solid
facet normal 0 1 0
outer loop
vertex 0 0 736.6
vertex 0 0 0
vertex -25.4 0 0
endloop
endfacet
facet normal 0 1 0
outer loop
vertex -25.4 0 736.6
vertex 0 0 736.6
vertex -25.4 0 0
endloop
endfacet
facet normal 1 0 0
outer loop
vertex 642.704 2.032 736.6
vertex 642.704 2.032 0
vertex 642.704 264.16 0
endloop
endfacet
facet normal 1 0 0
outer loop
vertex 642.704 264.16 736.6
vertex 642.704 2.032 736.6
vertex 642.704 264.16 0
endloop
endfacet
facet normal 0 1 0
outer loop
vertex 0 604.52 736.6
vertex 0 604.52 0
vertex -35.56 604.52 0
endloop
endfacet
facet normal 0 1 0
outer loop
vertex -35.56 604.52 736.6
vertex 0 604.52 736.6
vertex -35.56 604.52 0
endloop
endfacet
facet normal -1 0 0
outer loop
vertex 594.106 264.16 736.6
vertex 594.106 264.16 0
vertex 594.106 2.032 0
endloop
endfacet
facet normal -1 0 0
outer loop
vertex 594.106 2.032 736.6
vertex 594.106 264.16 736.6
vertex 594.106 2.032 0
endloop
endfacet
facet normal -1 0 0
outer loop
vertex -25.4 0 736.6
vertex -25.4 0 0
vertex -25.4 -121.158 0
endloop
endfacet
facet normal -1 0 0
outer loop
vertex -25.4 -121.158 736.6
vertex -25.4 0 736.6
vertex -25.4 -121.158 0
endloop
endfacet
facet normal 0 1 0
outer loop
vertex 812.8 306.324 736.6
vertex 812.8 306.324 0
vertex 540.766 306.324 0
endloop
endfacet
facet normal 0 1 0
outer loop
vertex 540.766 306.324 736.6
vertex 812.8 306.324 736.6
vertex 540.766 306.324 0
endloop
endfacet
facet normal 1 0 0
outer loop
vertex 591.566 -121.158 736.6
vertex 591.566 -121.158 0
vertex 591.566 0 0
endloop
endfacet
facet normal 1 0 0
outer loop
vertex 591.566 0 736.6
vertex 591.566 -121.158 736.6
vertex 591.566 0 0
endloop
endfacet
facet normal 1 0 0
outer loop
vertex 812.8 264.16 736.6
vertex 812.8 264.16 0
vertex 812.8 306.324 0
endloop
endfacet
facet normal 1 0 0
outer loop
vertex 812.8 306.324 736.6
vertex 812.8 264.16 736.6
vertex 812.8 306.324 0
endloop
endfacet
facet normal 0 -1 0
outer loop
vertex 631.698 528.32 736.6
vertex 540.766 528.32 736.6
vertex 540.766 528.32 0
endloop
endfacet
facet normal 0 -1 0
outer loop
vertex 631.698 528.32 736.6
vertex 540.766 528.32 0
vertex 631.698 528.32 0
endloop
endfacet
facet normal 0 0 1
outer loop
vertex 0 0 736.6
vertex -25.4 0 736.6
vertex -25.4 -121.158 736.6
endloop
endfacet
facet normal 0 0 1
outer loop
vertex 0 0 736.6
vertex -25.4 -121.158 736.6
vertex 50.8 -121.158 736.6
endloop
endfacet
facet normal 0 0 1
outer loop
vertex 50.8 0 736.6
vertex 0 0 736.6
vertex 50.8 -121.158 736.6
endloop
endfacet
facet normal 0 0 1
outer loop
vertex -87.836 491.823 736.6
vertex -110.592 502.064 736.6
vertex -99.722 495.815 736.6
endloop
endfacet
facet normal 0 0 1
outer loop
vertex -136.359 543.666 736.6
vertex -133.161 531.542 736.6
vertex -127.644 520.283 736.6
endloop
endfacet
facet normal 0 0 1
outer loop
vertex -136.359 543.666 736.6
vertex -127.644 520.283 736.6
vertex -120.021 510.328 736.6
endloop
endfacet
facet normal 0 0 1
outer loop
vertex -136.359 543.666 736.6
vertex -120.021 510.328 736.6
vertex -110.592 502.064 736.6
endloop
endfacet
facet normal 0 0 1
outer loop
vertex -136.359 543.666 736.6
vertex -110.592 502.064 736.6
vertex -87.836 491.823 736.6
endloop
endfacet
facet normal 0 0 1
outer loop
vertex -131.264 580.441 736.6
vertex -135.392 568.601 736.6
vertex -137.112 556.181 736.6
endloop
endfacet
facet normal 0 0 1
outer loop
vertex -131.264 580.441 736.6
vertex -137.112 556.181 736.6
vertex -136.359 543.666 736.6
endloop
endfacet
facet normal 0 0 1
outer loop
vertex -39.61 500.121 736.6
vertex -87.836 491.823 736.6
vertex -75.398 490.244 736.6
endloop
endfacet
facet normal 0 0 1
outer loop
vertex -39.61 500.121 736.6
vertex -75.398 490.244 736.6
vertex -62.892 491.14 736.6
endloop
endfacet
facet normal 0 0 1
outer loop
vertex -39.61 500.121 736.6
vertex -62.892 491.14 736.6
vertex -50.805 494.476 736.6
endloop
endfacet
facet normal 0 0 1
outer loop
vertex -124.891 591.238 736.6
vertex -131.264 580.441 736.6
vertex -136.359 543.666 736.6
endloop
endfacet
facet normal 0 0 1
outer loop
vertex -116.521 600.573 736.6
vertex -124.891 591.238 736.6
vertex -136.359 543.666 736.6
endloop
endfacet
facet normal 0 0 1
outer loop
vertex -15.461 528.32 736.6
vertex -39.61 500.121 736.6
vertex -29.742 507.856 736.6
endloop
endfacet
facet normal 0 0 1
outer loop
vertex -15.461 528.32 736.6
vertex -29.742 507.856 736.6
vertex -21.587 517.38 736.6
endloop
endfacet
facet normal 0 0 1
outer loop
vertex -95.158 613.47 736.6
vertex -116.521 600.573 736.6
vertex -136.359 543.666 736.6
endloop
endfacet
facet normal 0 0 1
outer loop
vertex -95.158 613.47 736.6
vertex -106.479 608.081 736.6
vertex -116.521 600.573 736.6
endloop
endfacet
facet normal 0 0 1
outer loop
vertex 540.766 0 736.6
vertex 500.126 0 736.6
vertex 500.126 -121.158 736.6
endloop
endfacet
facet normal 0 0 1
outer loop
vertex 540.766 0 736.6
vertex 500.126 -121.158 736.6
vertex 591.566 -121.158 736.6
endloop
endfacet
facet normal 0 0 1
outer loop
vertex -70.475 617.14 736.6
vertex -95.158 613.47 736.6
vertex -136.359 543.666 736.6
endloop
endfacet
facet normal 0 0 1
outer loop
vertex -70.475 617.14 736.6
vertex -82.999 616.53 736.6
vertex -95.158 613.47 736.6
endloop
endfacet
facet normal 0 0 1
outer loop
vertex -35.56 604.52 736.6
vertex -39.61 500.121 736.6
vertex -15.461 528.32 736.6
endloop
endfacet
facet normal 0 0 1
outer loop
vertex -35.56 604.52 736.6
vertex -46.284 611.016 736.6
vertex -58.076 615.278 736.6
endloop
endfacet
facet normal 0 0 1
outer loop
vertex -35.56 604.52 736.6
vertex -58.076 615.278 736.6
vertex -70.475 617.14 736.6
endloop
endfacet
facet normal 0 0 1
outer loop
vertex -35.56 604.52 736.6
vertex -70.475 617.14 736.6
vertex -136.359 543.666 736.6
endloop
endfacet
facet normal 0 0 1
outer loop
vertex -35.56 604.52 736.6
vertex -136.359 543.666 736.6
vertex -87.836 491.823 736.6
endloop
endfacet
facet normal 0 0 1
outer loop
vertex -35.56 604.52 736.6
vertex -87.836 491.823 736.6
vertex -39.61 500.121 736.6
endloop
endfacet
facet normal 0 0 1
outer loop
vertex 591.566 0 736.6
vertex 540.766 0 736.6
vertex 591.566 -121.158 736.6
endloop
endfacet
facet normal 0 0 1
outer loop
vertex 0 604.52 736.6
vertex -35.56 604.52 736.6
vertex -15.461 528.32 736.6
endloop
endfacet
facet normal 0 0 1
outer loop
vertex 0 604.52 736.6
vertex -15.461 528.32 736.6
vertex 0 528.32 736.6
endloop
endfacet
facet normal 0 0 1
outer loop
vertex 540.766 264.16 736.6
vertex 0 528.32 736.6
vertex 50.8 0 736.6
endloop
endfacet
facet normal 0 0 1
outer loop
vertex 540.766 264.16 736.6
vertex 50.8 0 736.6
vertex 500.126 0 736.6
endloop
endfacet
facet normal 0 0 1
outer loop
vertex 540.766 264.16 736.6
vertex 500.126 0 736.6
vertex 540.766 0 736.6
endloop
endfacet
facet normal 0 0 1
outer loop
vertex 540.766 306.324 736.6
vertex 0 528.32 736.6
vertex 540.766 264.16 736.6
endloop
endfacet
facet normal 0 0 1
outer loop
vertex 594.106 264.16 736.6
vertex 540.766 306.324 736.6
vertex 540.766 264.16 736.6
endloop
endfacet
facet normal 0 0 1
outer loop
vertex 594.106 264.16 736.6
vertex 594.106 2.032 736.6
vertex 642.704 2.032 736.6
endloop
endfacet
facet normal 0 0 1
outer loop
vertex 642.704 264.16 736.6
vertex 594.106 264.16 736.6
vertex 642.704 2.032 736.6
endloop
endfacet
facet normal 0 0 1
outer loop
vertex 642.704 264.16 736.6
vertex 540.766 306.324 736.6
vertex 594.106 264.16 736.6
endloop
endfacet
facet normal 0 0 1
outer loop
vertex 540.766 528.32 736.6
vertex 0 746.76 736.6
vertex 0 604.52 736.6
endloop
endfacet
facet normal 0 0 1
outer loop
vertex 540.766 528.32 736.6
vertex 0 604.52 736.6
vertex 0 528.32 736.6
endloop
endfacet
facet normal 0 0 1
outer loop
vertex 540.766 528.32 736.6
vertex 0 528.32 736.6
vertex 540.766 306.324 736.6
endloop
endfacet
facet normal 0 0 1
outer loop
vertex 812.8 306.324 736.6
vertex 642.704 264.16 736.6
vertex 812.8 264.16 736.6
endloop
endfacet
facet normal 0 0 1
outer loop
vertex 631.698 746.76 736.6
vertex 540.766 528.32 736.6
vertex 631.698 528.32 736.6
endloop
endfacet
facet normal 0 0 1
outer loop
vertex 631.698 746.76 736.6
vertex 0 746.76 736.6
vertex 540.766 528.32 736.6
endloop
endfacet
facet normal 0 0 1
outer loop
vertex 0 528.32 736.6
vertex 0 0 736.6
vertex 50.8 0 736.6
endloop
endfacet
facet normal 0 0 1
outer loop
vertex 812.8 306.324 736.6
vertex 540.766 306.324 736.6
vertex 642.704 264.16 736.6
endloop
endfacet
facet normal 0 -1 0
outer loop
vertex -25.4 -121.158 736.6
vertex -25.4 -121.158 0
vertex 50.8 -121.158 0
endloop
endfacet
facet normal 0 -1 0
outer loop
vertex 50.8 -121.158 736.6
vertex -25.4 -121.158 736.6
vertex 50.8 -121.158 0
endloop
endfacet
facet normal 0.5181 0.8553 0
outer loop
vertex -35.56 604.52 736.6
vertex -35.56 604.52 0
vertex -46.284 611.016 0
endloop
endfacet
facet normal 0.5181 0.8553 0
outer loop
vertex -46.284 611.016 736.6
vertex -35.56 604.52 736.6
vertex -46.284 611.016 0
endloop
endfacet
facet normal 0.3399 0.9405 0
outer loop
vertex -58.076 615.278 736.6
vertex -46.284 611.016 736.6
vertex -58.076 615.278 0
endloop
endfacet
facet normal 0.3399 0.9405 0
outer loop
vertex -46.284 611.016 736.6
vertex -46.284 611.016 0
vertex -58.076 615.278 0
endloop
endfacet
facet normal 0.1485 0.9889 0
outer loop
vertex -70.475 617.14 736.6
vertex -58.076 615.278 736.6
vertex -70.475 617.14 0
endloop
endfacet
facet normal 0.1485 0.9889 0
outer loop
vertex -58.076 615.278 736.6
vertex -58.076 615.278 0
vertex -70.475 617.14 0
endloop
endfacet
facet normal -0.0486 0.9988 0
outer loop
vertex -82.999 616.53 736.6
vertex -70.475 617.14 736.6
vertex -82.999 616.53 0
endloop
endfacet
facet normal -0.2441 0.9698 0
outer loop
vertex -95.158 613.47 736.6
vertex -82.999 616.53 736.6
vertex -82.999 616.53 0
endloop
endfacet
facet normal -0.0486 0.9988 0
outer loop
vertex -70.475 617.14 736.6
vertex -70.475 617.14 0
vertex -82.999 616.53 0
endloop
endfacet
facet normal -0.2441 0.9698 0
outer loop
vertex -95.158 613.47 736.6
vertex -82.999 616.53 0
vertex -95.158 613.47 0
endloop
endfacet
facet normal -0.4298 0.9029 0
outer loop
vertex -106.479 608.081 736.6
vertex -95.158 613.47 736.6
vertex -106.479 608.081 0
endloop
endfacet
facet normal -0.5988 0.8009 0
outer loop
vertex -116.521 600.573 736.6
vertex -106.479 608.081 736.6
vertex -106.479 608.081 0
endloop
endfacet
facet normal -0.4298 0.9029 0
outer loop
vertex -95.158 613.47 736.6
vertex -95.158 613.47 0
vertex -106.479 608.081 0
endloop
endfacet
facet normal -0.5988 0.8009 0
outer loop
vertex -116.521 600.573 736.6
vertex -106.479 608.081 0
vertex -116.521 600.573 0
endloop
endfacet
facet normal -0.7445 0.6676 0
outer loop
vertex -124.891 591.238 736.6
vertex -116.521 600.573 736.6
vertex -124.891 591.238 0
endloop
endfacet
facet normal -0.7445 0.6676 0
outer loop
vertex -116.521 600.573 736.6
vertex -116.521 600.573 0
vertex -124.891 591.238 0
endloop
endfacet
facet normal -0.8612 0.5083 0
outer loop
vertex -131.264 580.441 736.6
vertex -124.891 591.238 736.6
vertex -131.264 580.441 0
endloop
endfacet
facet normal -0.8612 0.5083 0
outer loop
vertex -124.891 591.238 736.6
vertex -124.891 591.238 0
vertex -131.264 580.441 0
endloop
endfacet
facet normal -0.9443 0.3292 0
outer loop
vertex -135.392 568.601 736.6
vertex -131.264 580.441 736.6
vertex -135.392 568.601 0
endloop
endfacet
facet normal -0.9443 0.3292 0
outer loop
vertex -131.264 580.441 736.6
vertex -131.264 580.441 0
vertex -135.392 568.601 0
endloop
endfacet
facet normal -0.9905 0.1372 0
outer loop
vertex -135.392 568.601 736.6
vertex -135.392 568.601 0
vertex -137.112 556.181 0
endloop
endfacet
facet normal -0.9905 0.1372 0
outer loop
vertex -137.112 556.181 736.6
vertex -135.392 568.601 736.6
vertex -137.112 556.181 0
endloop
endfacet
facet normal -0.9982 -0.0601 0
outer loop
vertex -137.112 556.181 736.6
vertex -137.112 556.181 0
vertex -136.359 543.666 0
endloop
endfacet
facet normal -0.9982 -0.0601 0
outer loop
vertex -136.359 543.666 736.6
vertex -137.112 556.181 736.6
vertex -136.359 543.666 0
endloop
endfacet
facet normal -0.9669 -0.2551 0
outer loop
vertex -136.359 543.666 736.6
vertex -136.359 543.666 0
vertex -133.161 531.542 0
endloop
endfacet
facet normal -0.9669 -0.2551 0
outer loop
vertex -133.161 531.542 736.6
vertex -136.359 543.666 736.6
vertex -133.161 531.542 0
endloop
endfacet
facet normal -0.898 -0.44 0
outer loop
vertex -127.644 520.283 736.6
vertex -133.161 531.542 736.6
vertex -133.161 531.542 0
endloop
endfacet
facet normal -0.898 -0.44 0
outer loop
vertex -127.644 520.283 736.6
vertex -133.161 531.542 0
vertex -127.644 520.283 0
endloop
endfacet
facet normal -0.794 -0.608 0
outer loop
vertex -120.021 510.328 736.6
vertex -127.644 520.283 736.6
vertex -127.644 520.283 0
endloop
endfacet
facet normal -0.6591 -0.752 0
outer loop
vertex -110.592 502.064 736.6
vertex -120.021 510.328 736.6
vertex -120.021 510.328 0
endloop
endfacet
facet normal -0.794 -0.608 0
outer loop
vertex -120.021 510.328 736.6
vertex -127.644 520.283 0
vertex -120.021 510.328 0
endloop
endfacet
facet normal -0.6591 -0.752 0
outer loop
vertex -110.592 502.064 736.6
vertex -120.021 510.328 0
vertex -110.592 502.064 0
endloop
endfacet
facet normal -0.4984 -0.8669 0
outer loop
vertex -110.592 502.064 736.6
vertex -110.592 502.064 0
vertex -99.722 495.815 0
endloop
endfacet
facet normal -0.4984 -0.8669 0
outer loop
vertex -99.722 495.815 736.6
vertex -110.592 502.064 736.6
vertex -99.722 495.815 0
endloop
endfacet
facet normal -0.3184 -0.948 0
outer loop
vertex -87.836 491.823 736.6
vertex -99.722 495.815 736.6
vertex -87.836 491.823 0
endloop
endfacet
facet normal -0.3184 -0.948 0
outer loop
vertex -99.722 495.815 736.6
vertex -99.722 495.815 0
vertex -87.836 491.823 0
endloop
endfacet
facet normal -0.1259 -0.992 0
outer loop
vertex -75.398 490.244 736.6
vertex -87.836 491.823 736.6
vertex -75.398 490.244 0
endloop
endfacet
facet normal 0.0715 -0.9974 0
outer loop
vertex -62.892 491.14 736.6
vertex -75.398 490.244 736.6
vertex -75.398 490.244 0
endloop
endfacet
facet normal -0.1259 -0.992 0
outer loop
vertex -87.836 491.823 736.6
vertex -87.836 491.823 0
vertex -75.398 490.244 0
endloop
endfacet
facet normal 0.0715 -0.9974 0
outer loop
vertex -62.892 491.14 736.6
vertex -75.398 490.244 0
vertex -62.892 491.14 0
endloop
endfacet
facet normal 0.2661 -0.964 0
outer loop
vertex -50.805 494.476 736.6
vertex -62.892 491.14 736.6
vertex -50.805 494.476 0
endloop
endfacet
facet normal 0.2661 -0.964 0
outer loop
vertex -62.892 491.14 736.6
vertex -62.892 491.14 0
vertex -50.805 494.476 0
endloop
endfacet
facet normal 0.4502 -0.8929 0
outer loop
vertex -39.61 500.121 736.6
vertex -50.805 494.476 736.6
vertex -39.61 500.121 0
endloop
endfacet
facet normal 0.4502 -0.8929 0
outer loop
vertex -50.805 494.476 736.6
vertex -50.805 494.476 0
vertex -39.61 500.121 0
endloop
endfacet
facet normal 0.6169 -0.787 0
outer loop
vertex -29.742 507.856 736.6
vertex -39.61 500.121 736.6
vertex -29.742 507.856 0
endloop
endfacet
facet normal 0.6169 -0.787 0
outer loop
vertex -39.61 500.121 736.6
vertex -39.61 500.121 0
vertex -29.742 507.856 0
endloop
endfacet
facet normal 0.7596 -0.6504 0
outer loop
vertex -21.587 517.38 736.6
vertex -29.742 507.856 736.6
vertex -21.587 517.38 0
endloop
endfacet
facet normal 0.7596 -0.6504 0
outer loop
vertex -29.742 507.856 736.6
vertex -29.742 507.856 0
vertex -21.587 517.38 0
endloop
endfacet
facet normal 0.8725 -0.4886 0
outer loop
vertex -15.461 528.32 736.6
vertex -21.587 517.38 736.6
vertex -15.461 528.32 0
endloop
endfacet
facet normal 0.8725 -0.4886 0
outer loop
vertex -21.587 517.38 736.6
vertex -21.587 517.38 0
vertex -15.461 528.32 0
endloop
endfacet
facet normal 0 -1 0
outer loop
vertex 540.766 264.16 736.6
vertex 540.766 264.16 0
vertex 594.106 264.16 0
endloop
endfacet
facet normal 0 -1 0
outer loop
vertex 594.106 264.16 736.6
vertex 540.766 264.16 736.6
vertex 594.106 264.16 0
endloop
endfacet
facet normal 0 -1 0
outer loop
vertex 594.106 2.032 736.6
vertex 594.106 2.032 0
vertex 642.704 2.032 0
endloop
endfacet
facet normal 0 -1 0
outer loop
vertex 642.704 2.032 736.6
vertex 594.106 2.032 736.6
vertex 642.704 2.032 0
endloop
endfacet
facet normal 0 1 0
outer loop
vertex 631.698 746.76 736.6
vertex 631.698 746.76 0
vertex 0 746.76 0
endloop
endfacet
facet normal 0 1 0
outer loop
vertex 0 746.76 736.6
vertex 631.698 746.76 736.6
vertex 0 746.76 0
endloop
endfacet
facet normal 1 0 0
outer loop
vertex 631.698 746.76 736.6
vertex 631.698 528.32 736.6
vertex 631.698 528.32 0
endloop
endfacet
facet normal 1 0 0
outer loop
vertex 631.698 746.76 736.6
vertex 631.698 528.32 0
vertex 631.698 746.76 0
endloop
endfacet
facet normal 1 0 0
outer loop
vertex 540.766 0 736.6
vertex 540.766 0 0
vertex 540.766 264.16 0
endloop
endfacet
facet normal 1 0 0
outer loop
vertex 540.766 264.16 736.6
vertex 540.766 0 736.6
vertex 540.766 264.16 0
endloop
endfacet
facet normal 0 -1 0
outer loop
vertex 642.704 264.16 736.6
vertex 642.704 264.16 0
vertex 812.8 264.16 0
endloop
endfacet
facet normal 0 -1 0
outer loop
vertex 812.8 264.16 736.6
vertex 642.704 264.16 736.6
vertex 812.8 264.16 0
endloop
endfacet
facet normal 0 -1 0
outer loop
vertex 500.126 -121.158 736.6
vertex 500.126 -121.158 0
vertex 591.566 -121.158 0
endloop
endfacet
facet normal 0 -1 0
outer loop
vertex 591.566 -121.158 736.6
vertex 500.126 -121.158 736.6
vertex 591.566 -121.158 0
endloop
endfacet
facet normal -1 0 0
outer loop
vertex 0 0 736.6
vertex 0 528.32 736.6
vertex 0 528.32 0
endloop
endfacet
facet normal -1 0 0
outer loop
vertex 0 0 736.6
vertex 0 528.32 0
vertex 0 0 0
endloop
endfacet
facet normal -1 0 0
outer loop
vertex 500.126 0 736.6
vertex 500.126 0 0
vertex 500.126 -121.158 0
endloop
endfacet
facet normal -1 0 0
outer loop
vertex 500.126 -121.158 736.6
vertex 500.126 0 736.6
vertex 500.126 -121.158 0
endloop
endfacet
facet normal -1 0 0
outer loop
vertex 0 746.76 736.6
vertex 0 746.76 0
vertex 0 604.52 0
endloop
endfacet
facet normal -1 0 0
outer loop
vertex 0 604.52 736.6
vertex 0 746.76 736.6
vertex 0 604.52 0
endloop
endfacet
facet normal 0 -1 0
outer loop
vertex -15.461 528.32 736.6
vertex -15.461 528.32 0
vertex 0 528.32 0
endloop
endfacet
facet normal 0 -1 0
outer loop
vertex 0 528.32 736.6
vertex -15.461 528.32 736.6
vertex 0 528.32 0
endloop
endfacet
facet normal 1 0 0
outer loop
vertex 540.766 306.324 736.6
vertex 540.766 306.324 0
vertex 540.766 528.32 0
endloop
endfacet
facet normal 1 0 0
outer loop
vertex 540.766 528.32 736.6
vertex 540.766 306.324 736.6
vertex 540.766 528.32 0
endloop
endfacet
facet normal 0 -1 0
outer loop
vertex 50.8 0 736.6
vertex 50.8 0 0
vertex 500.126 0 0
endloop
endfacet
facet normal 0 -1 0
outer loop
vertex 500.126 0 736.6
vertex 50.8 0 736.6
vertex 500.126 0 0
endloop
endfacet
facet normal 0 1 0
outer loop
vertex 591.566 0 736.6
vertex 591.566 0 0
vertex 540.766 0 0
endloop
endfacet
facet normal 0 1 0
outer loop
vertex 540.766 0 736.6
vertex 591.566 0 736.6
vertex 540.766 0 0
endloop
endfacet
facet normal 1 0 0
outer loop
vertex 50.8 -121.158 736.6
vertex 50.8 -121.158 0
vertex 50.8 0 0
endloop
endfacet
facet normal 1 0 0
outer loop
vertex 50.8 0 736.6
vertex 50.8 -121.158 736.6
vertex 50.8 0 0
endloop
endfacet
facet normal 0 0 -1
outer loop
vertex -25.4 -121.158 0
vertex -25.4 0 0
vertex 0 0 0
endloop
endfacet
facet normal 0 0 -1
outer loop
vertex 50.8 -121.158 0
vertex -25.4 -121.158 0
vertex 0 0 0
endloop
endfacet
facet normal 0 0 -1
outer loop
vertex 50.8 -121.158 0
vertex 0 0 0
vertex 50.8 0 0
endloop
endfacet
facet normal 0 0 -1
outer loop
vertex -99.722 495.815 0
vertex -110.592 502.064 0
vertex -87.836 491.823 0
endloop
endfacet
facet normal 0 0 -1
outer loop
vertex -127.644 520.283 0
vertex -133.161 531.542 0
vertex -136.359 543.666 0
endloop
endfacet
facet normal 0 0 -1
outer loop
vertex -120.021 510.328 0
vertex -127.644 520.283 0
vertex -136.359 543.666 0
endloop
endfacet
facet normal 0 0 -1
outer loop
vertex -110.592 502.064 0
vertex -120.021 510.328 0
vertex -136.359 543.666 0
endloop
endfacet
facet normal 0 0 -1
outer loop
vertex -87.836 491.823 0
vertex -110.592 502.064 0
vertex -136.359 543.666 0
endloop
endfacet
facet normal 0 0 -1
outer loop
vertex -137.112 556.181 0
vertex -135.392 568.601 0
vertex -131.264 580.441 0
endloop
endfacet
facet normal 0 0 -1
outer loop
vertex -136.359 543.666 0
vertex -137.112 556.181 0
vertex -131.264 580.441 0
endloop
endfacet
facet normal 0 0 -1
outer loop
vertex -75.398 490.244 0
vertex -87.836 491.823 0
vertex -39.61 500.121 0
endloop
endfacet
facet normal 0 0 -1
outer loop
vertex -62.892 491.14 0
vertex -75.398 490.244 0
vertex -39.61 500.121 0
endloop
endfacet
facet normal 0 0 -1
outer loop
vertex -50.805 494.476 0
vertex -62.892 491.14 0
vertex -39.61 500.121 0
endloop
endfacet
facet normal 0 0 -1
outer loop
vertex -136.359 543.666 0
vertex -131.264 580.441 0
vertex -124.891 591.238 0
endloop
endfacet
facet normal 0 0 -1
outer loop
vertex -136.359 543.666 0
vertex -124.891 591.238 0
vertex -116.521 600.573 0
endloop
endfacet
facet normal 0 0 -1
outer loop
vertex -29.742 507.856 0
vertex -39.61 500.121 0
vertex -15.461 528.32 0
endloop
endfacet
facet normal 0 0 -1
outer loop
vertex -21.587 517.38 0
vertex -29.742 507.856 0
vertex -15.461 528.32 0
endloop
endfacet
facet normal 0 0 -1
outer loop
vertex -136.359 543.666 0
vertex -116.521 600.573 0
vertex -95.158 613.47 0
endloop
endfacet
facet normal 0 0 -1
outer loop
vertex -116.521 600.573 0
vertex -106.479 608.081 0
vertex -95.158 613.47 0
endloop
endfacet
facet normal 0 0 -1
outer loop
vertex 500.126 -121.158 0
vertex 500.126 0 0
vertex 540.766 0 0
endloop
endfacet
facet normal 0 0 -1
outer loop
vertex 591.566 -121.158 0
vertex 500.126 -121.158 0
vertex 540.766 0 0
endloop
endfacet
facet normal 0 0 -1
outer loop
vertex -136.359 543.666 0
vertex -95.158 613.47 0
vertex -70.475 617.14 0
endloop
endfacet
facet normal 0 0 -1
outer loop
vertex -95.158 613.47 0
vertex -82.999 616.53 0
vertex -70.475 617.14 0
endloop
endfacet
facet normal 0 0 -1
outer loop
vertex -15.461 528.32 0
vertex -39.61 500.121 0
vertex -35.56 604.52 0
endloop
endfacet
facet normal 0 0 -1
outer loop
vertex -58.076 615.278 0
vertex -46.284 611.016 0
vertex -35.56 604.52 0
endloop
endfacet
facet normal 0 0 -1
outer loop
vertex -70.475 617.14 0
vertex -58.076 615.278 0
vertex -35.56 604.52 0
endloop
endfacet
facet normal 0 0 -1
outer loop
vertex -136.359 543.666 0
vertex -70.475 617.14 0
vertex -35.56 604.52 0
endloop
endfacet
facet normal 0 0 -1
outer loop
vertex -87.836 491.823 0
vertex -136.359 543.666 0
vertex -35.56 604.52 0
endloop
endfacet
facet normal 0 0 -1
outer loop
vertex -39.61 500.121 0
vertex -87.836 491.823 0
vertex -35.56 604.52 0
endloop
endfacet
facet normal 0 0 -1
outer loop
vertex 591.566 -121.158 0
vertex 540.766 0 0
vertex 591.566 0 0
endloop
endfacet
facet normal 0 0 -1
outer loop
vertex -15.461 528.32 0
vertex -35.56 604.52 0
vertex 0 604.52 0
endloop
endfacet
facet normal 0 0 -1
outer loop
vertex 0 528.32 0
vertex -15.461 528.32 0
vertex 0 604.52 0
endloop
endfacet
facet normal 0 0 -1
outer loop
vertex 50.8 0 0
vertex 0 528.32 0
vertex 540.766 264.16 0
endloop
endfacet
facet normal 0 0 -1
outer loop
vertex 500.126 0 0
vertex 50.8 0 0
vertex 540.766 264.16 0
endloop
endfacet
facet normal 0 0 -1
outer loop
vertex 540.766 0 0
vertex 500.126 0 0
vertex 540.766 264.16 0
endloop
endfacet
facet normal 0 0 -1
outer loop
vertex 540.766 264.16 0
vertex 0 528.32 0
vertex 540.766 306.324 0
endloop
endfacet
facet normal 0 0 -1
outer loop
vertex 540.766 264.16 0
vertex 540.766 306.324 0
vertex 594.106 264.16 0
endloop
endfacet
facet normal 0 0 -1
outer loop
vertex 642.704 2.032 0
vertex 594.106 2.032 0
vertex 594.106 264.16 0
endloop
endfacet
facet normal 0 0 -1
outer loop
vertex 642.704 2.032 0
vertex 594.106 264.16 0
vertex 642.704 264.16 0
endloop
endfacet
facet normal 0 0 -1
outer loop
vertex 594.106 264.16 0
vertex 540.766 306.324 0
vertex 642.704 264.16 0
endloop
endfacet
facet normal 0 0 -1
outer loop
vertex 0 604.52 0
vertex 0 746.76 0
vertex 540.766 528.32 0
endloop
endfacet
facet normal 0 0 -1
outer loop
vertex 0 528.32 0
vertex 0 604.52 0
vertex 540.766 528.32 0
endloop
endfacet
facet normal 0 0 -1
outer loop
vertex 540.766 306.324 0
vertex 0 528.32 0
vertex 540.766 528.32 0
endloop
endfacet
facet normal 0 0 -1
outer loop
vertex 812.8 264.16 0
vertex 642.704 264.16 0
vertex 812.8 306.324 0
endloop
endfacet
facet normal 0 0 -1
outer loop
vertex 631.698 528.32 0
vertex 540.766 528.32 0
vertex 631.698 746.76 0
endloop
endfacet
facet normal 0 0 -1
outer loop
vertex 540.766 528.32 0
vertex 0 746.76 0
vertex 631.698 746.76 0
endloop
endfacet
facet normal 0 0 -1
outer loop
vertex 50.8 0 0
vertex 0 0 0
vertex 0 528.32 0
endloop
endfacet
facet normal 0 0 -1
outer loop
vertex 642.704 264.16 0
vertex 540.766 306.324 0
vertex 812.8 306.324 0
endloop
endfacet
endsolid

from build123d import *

# Parameters (mm, degrees)
BOSS_EXTRUDE1_DEPTH = 736.6


with BuildPart() as part:
    # Sketch1 → Boss-Extrude1 (new body)
    with BuildSketch(Plane.XY):
        with BuildLine():
            Line((540.766, 306.324), (540.766, 528.32))
            Line((540.766, 528.32), (631.698, 528.32))
            Line((631.698, 528.32), (631.698, 550.164))
            Line((631.698, 550.164), (631.698, 746.76))
            Line((631.698, 746.76), (0, 746.76))
            Line((0, 746.76), (0, 604.52))
            Line((0, 604.52), (-35.56, 604.52))
            ThreePointArc((-35.56, 604.52), (-135.060085104, 537.524952941), (-15.461288674, 528.32))
            Line((-15.461288674, 528.32), (0, 528.32))
            Line((0, 528.32), (0, 0))
            Line((0, 0), (-25.4, 0))
            Line((-25.4, 0), (-25.4, -121.158))
            Line((-25.4, -121.158), (50.8, -121.158))
            Line((50.8, -121.158), (50.8, 0))
            Line((50.8, 0), (500.126, 0))
            Line((500.126, 0), (500.126, -121.158))
            Line((500.126, -121.158), (591.566, -121.158))
            Line((591.566, -121.158), (591.566, 0))
            Line((591.566, 0), (540.766, 0))
            Line((540.766, 0), (540.766, 264.16))
            Line((540.766, 264.16), (594.106, 264.16))
            Line((594.106, 264.16), (594.106, 2.032))
            Line((594.106, 2.032), (642.704381111, 2.032))
            Line((642.704381111, 2.032), (642.704381111, 264.16))
            Line((642.704381111, 264.16), (812.8, 264.16))
            Line((812.8, 264.16), (812.8, 306.324))
            Line((812.8, 306.324), (540.766, 306.324))
        make_face()
    extrude(amount=BOSS_EXTRUDE1_DEPTH)


solid = part.part
